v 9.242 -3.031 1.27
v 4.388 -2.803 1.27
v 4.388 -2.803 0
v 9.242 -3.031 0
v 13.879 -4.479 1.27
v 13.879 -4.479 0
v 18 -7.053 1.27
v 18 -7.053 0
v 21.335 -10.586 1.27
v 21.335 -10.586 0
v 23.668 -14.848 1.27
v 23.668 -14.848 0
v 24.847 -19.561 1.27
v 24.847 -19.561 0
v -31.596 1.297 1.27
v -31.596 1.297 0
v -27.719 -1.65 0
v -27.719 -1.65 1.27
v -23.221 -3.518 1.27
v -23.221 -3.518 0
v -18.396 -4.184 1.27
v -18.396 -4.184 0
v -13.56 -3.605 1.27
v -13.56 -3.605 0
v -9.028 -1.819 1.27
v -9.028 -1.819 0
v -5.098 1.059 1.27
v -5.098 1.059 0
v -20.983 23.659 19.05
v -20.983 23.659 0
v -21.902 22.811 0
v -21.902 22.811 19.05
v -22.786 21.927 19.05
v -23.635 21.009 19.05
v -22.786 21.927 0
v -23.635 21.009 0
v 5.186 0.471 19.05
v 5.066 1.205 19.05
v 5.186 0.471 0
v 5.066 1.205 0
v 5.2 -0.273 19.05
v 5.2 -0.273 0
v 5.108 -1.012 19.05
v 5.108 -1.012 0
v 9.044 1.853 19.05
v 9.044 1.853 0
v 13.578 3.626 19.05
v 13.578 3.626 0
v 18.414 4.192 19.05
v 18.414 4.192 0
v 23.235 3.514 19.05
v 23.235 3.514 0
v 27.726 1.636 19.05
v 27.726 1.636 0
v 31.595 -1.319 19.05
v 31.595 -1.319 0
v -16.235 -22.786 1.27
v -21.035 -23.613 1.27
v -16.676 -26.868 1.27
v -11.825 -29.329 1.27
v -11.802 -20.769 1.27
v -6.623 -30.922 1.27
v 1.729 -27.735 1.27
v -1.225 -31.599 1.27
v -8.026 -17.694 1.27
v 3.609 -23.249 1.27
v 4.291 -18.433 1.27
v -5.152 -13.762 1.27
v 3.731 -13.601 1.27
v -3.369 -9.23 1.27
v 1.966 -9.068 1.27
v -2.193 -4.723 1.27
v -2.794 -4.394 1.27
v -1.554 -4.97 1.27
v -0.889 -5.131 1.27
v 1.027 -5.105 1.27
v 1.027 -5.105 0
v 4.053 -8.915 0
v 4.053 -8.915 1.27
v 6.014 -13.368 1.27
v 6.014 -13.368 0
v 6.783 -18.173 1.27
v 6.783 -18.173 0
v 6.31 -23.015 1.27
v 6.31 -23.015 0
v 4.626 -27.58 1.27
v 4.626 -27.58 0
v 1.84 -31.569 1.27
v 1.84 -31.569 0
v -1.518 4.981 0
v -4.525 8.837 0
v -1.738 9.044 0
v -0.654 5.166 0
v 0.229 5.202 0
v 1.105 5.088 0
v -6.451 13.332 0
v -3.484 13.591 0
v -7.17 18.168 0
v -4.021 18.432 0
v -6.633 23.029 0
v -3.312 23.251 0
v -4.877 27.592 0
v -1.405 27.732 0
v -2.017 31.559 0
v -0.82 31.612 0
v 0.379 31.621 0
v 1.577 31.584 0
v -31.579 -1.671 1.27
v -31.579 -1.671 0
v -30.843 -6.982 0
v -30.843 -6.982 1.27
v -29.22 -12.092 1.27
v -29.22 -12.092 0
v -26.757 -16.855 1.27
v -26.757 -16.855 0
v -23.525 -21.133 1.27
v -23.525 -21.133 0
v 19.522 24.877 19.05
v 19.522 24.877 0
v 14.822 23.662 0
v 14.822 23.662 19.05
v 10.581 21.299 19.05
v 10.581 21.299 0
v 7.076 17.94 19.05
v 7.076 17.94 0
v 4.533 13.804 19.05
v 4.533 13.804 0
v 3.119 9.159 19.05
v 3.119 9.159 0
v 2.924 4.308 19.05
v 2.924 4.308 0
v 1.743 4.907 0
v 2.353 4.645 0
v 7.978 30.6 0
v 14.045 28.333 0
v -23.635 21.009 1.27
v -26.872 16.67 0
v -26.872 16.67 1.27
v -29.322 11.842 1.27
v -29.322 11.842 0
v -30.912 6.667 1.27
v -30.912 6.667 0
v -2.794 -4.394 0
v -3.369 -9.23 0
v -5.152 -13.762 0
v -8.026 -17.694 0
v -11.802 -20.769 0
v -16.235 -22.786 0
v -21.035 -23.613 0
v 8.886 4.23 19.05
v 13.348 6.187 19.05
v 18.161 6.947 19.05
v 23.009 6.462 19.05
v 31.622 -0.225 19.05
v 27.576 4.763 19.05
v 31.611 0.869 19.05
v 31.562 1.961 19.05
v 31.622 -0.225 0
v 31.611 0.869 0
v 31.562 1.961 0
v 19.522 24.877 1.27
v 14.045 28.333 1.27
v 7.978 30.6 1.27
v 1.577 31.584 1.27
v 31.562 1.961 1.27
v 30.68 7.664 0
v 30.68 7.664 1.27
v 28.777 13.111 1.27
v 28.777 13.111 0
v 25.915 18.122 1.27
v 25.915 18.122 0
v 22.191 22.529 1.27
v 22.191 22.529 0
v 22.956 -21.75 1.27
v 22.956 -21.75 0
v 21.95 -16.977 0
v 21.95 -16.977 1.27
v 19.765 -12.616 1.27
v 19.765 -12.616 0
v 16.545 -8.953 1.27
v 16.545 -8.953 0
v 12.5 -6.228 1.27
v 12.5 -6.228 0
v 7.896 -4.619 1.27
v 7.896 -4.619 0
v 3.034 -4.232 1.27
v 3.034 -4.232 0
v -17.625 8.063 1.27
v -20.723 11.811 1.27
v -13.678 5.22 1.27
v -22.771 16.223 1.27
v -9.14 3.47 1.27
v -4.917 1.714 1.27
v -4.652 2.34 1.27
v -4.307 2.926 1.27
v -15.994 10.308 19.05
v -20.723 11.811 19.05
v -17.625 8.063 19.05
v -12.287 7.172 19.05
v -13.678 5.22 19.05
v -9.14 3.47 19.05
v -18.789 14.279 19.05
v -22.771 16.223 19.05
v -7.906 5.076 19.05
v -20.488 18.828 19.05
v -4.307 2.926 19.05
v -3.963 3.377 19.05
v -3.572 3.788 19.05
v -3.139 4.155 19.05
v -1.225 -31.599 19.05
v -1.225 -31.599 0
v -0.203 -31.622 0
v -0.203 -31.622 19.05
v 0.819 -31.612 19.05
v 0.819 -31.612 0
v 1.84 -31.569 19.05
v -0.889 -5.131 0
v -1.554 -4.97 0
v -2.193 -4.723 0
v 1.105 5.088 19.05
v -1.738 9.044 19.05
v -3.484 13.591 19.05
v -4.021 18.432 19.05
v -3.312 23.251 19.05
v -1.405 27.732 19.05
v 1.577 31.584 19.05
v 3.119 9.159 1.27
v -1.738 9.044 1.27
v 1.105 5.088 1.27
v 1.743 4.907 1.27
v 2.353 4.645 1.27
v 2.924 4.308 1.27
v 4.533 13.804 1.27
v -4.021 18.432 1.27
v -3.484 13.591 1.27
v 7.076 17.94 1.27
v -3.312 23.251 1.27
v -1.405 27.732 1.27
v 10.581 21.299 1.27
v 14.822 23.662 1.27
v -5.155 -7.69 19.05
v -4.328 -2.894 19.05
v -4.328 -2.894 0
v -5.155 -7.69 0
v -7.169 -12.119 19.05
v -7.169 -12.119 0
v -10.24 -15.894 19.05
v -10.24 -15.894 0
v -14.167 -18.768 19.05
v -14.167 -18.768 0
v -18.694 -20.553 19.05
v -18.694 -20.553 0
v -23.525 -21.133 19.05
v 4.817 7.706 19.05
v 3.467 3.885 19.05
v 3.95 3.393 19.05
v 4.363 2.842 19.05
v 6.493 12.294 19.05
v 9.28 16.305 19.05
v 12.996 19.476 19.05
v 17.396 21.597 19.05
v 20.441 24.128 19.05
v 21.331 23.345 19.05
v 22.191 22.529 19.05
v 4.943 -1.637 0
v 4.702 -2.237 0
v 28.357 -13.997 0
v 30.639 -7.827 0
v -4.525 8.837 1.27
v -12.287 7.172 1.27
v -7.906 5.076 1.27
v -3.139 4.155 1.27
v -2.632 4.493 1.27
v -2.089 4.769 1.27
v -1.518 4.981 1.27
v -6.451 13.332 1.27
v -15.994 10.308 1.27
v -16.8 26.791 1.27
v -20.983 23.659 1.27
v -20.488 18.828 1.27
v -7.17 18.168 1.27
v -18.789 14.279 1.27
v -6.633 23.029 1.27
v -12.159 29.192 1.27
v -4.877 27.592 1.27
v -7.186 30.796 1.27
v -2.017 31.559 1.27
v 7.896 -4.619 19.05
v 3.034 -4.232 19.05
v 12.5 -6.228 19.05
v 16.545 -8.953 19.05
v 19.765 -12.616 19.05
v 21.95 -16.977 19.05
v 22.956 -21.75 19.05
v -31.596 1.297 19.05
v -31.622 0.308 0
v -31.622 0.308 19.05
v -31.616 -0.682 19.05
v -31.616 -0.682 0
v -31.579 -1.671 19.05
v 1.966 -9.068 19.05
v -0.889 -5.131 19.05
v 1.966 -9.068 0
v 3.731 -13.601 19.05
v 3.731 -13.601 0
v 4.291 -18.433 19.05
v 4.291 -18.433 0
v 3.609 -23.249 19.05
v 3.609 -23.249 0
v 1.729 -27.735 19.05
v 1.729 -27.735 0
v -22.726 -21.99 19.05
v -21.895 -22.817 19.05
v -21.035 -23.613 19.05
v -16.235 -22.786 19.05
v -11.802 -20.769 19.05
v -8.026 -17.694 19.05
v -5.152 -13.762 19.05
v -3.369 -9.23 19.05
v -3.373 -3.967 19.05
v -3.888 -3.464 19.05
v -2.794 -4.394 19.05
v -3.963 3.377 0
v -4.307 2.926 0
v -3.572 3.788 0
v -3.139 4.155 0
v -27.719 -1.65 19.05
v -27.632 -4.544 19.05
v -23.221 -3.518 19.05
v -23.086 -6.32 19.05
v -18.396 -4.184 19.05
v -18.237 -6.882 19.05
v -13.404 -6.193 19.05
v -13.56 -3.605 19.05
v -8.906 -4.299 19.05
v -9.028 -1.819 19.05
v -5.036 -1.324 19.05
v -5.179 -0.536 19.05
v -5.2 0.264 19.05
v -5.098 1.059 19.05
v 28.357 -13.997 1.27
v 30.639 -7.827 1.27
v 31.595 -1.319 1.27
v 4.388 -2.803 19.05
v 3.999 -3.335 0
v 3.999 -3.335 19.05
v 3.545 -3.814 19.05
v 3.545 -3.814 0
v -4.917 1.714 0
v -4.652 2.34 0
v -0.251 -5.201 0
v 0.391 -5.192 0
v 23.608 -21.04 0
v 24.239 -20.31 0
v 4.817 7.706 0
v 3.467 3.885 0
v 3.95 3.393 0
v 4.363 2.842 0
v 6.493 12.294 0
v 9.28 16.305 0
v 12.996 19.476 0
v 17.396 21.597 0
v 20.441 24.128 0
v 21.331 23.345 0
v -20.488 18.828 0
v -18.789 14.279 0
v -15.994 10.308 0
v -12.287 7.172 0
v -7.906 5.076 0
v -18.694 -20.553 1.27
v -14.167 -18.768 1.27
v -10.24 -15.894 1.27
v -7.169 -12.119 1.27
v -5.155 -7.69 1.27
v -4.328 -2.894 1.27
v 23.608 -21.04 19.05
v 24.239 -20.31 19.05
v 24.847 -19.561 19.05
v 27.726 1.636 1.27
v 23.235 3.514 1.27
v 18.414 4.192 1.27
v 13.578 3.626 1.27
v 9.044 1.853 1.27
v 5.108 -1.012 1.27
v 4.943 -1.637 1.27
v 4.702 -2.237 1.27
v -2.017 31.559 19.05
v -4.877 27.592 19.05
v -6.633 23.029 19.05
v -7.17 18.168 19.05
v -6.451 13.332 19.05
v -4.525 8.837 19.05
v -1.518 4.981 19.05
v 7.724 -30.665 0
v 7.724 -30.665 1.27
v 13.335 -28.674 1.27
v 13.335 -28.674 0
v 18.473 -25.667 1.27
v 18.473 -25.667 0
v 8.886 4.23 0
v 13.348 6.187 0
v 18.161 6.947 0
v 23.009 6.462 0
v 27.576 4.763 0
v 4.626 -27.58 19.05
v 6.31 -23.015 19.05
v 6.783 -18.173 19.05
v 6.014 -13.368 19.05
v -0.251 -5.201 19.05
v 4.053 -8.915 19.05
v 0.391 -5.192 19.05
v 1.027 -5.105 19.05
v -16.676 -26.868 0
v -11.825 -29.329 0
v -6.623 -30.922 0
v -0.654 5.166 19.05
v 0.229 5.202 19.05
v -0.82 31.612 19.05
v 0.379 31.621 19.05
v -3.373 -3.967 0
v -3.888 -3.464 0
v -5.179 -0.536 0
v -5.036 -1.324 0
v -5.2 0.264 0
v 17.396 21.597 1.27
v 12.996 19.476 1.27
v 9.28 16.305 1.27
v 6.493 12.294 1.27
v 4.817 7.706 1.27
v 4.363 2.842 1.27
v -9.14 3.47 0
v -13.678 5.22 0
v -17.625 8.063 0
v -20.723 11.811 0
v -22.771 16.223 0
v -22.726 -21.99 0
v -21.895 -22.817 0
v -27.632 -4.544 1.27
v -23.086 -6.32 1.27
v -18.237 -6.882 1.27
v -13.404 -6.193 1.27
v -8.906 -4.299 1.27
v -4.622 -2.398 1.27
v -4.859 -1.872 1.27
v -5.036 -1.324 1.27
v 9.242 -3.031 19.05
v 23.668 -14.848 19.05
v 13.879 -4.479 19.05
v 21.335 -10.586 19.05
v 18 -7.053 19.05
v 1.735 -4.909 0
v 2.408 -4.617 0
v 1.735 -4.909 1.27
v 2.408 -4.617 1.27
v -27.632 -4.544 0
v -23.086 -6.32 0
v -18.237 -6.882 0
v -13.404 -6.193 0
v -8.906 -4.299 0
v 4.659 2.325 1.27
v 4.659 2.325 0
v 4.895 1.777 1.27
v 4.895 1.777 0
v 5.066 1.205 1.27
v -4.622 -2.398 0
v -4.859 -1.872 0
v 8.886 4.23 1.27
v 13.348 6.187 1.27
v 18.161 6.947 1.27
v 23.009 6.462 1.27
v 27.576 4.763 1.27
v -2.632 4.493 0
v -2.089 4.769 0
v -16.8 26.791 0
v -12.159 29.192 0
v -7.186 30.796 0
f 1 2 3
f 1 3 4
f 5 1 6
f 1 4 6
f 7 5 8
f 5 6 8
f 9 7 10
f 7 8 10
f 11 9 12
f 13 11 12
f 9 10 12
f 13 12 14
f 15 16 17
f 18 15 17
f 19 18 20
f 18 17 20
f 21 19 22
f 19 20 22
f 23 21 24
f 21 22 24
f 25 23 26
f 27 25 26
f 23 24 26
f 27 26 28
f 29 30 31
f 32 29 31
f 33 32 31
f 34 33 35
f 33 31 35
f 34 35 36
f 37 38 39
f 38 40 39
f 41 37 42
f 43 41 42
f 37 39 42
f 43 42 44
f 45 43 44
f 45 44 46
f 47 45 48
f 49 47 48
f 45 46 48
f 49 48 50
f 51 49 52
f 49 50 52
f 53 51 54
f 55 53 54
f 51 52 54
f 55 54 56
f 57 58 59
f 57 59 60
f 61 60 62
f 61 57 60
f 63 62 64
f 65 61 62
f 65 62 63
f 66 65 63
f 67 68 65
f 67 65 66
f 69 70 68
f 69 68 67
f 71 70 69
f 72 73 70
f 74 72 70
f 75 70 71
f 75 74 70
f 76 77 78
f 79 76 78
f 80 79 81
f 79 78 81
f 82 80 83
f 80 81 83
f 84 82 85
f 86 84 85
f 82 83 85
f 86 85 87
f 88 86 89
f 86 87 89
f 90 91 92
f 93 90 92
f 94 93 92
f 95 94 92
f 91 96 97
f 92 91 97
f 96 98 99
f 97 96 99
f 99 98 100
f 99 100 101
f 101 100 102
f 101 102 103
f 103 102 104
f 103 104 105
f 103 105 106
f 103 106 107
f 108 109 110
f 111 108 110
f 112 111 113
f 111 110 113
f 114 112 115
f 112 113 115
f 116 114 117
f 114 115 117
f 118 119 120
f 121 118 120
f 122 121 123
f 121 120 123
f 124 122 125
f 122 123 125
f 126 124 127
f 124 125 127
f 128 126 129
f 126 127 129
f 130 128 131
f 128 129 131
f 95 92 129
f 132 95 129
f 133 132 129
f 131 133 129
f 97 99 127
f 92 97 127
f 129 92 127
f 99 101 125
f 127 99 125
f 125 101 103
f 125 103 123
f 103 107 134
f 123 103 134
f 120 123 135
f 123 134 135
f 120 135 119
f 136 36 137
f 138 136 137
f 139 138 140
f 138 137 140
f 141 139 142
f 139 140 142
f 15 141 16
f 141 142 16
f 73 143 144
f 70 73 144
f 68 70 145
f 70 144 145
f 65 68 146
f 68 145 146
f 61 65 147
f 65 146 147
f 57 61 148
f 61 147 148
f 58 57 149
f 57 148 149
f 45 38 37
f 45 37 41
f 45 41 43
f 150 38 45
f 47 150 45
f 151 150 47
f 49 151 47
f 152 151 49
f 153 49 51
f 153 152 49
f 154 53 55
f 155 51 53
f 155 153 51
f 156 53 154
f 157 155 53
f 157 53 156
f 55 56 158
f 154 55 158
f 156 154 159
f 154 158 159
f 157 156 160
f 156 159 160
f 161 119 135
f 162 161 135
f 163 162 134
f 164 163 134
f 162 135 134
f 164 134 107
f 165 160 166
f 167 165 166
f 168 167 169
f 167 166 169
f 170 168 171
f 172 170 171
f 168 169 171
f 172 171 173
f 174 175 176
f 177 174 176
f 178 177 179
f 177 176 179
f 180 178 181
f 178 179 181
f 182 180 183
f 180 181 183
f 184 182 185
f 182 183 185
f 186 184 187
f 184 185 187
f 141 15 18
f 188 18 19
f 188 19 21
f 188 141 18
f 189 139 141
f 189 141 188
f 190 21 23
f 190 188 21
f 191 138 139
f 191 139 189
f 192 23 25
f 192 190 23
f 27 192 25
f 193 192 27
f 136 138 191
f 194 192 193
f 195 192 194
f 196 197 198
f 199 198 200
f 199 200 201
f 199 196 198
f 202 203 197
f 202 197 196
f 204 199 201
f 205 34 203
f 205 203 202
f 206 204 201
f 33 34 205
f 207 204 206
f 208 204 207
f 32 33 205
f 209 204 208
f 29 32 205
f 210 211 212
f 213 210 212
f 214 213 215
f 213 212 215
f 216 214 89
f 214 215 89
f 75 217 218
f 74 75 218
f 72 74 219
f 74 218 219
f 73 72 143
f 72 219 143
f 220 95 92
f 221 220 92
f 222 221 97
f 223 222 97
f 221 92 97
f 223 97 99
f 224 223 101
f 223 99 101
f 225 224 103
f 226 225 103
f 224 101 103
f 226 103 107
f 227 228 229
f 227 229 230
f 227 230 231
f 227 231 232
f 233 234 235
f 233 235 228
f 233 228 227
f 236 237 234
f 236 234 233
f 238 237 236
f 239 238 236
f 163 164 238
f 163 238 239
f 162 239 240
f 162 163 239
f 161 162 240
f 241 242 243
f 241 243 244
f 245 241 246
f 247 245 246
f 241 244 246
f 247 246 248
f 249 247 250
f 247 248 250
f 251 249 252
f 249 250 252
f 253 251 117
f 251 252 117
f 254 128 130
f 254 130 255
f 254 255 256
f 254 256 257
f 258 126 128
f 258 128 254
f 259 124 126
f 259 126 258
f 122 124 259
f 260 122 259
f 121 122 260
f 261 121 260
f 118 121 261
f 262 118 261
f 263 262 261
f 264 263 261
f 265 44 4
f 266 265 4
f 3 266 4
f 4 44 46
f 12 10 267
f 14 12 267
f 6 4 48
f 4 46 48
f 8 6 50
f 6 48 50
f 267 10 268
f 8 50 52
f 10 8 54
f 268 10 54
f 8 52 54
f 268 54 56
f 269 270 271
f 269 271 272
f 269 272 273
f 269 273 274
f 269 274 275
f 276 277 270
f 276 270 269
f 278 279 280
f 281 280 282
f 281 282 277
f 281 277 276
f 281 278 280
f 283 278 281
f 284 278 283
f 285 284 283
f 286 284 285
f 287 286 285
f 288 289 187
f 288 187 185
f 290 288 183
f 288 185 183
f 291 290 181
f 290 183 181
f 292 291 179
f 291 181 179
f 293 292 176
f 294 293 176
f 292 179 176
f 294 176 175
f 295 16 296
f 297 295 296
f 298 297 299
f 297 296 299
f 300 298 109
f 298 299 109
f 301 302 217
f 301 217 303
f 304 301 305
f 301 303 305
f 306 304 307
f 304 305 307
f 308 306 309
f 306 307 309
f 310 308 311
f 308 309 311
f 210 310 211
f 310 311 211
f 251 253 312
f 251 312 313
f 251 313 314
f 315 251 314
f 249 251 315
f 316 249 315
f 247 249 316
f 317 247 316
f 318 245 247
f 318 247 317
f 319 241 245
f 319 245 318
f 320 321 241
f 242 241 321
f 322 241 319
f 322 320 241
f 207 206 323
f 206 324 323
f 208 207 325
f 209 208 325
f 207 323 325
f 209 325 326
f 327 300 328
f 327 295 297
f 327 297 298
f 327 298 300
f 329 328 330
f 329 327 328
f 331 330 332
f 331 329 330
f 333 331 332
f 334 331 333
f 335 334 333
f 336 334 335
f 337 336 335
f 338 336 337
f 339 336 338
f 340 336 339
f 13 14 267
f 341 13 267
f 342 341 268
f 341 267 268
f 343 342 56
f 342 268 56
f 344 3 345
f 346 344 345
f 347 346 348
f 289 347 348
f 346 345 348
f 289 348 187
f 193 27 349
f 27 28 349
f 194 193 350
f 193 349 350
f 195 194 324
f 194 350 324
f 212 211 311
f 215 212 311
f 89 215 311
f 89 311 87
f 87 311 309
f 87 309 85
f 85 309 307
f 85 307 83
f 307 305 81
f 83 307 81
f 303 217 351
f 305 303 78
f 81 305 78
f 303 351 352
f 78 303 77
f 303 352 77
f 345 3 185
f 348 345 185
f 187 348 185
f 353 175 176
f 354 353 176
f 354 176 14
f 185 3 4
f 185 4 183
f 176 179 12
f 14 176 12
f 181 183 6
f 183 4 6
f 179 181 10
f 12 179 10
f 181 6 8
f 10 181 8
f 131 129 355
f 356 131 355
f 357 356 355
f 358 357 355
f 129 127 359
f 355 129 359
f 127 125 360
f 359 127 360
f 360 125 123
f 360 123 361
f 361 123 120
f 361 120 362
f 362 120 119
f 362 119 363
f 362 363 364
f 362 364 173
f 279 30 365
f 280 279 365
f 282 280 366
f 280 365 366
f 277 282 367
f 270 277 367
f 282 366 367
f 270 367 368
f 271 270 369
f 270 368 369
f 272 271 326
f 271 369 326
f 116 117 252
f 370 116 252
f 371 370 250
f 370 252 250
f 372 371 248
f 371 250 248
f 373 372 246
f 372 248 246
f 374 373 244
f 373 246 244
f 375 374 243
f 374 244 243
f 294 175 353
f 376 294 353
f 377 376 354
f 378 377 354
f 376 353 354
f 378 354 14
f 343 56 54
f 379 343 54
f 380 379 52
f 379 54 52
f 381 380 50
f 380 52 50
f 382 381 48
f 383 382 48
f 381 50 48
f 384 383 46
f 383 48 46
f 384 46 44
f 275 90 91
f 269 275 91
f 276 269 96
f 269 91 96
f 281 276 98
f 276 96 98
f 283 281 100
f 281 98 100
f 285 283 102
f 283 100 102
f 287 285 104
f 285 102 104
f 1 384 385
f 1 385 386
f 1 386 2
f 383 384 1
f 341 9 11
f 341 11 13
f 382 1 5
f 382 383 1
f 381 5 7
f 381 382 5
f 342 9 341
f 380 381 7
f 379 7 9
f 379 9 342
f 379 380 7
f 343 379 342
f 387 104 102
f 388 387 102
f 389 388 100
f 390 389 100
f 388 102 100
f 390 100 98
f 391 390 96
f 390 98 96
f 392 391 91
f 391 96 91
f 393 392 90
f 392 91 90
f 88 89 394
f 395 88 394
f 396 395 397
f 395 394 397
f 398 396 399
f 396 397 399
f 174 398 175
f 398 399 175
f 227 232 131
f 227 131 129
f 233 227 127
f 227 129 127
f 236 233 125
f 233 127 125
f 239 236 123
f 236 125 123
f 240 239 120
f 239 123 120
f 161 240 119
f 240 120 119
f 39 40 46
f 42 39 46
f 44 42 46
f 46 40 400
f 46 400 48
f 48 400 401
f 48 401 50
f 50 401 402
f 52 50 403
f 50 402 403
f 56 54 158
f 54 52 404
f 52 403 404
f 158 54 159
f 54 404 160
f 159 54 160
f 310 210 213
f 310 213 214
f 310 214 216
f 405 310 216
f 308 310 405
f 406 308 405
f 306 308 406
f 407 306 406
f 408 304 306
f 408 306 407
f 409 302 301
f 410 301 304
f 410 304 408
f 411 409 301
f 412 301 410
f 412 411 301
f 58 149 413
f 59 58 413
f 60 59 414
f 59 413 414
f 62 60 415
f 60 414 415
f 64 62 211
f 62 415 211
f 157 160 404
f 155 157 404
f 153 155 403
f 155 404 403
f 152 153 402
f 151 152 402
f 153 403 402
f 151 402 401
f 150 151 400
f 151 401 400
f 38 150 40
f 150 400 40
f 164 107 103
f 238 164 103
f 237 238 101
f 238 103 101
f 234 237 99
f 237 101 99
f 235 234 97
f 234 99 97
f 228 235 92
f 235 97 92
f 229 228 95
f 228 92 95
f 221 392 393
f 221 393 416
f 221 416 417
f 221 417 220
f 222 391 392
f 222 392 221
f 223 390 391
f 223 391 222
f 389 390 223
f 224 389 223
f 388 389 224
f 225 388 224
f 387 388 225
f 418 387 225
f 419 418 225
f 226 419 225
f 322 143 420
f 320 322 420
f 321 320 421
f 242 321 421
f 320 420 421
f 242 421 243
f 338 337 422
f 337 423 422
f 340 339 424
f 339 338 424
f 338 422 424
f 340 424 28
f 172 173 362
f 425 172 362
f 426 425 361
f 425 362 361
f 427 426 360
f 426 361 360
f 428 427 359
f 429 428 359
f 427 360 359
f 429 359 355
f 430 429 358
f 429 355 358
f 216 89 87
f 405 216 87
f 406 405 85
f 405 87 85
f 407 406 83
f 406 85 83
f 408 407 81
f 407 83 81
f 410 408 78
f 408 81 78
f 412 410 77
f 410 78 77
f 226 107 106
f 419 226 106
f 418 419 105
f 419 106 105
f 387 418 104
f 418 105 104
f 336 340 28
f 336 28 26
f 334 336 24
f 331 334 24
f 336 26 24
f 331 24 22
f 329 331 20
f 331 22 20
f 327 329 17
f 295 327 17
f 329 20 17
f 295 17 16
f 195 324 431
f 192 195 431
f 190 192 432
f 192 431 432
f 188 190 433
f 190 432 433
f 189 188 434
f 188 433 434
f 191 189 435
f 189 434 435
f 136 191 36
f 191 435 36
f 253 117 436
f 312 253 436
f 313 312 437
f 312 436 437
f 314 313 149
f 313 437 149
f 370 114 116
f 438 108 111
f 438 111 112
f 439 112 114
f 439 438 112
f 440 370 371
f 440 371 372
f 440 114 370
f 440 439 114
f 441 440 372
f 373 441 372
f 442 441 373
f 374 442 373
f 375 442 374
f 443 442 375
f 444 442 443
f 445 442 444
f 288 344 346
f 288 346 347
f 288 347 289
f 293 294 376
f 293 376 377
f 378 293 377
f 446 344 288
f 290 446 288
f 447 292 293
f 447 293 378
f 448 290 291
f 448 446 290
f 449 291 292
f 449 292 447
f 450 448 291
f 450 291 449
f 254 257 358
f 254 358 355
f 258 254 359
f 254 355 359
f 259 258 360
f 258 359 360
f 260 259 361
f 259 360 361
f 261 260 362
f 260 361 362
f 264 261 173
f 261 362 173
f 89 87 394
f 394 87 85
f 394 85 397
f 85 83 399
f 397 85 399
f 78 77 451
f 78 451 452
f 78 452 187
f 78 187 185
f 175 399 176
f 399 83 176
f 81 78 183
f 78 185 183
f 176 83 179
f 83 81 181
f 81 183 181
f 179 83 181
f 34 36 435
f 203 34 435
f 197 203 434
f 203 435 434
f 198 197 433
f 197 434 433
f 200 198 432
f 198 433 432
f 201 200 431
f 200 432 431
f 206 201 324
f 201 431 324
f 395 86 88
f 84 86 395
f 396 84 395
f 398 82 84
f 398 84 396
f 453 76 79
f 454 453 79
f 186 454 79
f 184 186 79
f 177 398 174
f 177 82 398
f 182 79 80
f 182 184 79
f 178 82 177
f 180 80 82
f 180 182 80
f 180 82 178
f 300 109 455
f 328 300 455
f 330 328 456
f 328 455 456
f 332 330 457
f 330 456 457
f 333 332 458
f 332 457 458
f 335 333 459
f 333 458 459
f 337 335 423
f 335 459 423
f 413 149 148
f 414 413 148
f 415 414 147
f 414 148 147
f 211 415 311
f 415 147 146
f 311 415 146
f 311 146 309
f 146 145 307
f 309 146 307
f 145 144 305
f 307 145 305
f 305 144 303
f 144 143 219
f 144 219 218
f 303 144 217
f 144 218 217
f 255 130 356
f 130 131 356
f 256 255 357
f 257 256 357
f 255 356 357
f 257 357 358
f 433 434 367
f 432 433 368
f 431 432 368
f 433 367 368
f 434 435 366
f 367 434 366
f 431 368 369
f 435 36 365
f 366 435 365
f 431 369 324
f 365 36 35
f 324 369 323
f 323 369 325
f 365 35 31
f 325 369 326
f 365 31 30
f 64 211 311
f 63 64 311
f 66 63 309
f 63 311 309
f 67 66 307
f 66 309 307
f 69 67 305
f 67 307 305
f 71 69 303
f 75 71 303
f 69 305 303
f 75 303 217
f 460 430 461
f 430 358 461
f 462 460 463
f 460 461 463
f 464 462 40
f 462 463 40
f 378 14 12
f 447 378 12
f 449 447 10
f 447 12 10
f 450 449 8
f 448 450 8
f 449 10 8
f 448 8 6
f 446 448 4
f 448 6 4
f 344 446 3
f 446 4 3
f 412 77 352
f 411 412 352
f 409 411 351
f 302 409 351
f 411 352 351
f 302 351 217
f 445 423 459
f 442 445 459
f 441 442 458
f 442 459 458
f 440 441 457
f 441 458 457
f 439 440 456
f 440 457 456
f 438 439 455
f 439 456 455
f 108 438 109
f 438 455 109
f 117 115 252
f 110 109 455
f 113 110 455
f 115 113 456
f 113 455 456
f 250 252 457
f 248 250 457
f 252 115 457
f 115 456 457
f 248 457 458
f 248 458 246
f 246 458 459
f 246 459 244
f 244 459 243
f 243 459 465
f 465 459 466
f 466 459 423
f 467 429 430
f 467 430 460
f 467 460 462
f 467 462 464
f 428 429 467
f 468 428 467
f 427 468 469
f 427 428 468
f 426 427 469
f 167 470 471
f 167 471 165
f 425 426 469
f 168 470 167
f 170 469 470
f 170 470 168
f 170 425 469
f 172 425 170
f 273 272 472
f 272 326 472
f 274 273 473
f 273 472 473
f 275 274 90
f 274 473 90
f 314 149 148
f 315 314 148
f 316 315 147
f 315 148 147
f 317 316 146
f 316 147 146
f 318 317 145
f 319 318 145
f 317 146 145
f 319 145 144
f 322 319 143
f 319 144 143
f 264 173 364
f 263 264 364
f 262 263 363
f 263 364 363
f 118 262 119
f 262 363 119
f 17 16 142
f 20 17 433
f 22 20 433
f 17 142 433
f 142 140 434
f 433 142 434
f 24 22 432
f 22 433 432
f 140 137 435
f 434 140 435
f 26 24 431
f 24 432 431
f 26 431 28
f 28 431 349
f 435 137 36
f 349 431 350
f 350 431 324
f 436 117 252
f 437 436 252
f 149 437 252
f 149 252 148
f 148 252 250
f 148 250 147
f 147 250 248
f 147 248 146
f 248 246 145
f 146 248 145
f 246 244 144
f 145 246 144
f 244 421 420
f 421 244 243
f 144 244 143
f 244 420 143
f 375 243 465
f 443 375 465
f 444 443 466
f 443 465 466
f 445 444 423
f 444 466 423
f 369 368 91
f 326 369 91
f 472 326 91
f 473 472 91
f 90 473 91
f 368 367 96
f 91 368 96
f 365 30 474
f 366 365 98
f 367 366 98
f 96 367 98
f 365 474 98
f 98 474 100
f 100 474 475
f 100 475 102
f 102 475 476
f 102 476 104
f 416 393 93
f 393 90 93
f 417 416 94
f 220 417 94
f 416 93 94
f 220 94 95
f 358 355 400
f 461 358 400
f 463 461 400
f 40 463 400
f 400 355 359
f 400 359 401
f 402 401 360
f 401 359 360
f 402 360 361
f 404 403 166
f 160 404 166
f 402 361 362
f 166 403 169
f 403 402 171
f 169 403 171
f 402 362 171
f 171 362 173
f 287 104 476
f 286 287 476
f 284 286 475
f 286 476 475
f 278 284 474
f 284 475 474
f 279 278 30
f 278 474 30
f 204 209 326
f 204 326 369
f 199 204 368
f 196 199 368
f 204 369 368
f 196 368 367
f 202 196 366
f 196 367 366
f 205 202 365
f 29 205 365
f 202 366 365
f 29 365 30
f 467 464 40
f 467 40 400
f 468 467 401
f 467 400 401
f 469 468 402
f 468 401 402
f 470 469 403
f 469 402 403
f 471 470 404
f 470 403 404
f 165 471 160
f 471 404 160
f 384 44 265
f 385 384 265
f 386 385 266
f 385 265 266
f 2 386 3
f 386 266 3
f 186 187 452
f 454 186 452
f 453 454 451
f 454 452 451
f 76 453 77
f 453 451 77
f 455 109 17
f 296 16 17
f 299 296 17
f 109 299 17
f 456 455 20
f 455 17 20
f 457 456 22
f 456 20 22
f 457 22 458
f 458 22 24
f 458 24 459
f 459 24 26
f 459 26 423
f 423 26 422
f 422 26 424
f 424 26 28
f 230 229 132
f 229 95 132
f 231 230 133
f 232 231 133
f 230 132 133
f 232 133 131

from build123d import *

# Parameters (mm, degrees)
F1_DEPTH = 19.05
F2_DEPTH = 1.27
F4_D     = 10.414
F4_2_D   = 10.414


with BuildPart() as f1:
    # F0 (on Top) → F1 (new body)
    with BuildSketch(Plane.XY):
        with BuildLine():
            ThreePointArc((-4.15057, 2.929021), (-3.596615, 3.587584), (-2.939447, 4.143194))
            ThreePointArc((-2.939447, 4.143194), (-15.926713, 10.234619), (-20.982556, 23.658962))
            ThreePointArc((-20.982556, 23.658962), (-22.348308, 22.373361), (-23.635438, 21.00905))
            ThreePointArc((-23.635438, 21.00905), (-17.567432, 8.009101), (-4.15057, 2.929021))
        make_face()
        with BuildLine():
            ThreePointArc((-1.414659, 4.879051), (-0.078206, 5.079398), (1.263782, 4.92029))
            ThreePointArc((1.263782, 4.92029), (-4.022436, 18.315919), (1.57705, 31.583652))
            ThreePointArc((1.57705, 31.583652), (-0.220309, 31.622233), (-2.016956, 31.558612))
            ThreePointArc((-2.016956, 31.558612), (-7.168019, 18.095747), (-1.414659, 4.879051))
        make_face()
        with BuildLine():
            ThreePointArc((2.939447, 4.143194), (3.738822, 3.439129), (4.373801, 2.583847))
            ThreePointArc((4.373801, 2.583847), (9.193806, 16.20891), (22.190942, 22.529452))
            ThreePointArc((22.190942, 22.529452), (20.88971, 23.74098), (19.522447, 24.877463))
            ThreePointArc((19.522447, 24.877463), (7.023926, 17.875049), (2.939447, 4.143194))
        make_face()
        with BuildLine():
            ThreePointArc((4.960279, 1.096374), (5.049981, 0.551446), (5.08, 0))
            ThreePointArc((5.08, 0), (5.045837, -0.588156), (4.943808, -1.168401))
            ThreePointArc((4.943808, -1.168401), (18.300314, 4.193169), (31.595492, -1.31872))
            ThreePointArc((31.595492, -1.31872), (31.621363, 0.32179), (31.562112, 1.961433))
            ThreePointArc((31.562112, 1.961433), (18.085065, 6.945155), (4.960279, 1.096374))
        make_face()
        with BuildLine():
            ThreePointArc((24.846985, -19.561224), (17.937118, -7.00249), (4.227848, -2.816328))
            ThreePointArc((4.227848, -2.816328), (3.580795, -3.603375), (2.789696, -4.245468))
            ThreePointArc((2.789696, -4.245468), (16.453026, -8.872834), (22.955675, -21.749738))
            ThreePointArc((22.955675, -21.749738), (23.926366, -20.677117), (24.846985, -19.561224))
        make_face()
        with BuildLine():
            ThreePointArc((1.839998, -31.569424), (6.78046, -18.095188), (0.91574, -4.996781))
            ThreePointArc((0.91574, -4.996781), (-0.063033, -5.079609), (-1.039449, -4.972519))
            ThreePointArc((-1.039449, -4.972519), (4.292181, -18.323762), (-1.225371, -31.59925))
            ThreePointArc((-1.225371, -31.59925), (0.307675, -31.621503), (1.839998, -31.569424))
        make_face()
        with BuildLine():
            ThreePointArc((-21.034558, -23.61274), (-7.97312, -17.63866), (-2.795924, -4.241369))
            ThreePointArc((-2.795924, -4.241369), (-3.643508, -3.53995), (-4.320202, -2.672499))
            ThreePointArc((-4.320202, -2.672499), (-10.15953, -15.817398), (-23.524903, -21.132749))
            ThreePointArc((-23.524903, -21.132749), (-22.31421, -22.407368), (-21.034558, -23.61274))
        make_face()
        with BuildLine():
            ThreePointArc((-4.931575, -1.219001), (-5.08, 0), (-4.931575, 1.219001))
            ThreePointArc((-4.931575, 1.219001), (-18.279969, -4.18489), (-31.596377, 1.297347))
            ThreePointArc((-31.596377, 1.297347), (-31.622446, -0.187197), (-31.578803, -1.671328))
            ThreePointArc((-31.578803, -1.671328), (-18.162923, -6.880688), (-4.931575, -1.219001))
        make_face()
    extrude(amount=F1_DEPTH)

    # F4 (through all)
    with Locations(Plane.XY.offset(19.05)):
        with Locations((0, 0)):
            Hole(F4_D / 2)


with BuildPart() as f2:
    # F0 (on Top) → F2 (new body)
    with BuildSketch(Plane.XY):
        with BuildLine():
            ThreePointArc((-4.931575, 1.219001), (-4.620864, 2.110454), (-4.15057, 2.929021))
            ThreePointArc((-4.15057, 2.929021), (-17.567432, 8.009101), (-23.635438, 21.00905))
            ThreePointArc((-23.635438, 21.00905), (-29.32194, 11.842211), (-31.596377, 1.297347))
            ThreePointArc((-31.596377, 1.297347), (-18.279969, -4.18489), (-4.931575, 1.219001))
        make_face()
        with BuildLine():
            ThreePointArc((-2.939447, 4.143194), (-2.207924, 4.575092), (-1.414659, 4.879051))
            ThreePointArc((-1.414659, 4.879051), (-7.168019, 18.095747), (-2.016956, 31.558612))
            ThreePointArc((-2.016956, 31.558612), (-12.159173, 29.191927), (-20.982556, 23.658962))
            ThreePointArc((-20.982556, 23.658962), (-15.926713, 10.234619), (-2.939447, 4.143194))
        make_face()
        with BuildLine():
            ThreePointArc((1.263782, 4.92029), (2.13723, 4.608541), (2.939447, 4.143194))
            ThreePointArc((2.939447, 4.143194), (7.023926, 17.875049), (19.522447, 24.877463))
            ThreePointArc((19.522447, 24.877463), (11.069798, 29.622183), (1.57705, 31.583652))
            ThreePointArc((1.57705, 31.583652), (-4.022436, 18.315919), (1.263782, 4.92029))
        make_face()
        with BuildLine():
            ThreePointArc((4.373801, 2.583847), (4.725929, 1.863329), (4.960279, 1.096374))
            ThreePointArc((4.960279, 1.096374), (18.085065, 6.945155), (31.562112, 1.961433))
            ThreePointArc((31.562112, 1.961433), (28.776875, 13.111277), (22.190942, 22.529452))
            ThreePointArc((22.190942, 22.529452), (9.193806, 16.20891), (4.373801, 2.583847))
        make_face()
        with BuildLine():
            ThreePointArc((31.595492, -1.31872), (18.300314, 4.193169), (4.943808, -1.168401))
            ThreePointArc((4.943808, -1.168401), (4.659263, -2.024269), (4.227848, -2.816328))
            ThreePointArc((4.227848, -2.816328), (17.937118, -7.00249), (24.846985, -19.561224))
            ThreePointArc((24.846985, -19.561224), (29.65865, -10.971718), (31.595492, -1.31872))
        make_face()
        with BuildLine():
            ThreePointArc((22.955675, -21.749738), (16.453026, -8.872834), (2.789696, -4.245468))
            ThreePointArc((2.789696, -4.245468), (1.890418, -4.715158), (0.91574, -4.996781))
            ThreePointArc((0.91574, -4.996781), (6.78046, -18.095188), (1.839998, -31.569424))
            ThreePointArc((1.839998, -31.569424), (13.334651, -28.674051), (22.955675, -21.749738))
        make_face()
        with BuildLine():
            ThreePointArc((-1.225371, -31.59925), (4.292181, -18.323762), (-1.039449, -4.972519))
            ThreePointArc((-1.039449, -4.972519), (-1.952221, -4.689908), (-2.795924, -4.241369))
            ThreePointArc((-2.795924, -4.241369), (-7.97312, -17.63866), (-21.034558, -23.61274))
            ThreePointArc((-21.034558, -23.61274), (-11.824644, -29.329029), (-1.225371, -31.59925))
        make_face()
        with BuildLine():
            ThreePointArc((-23.524903, -21.132749), (-10.15953, -15.817398), (-4.320202, -2.672499))
            ThreePointArc((-4.320202, -2.672499), (-4.682629, -1.969616), (-4.931575, -1.219001))
            ThreePointArc((-4.931575, -1.219001), (-18.162923, -6.880688), (-31.578803, -1.671328))
            ThreePointArc((-31.578803, -1.671328), (-29.219708, -12.092262), (-23.524903, -21.132749))
        make_face()
    extrude(amount=F2_DEPTH)

    # F4#2 (through all)
    with Locations(Plane.XY.offset(19.05)):
        with Locations((0, 0)):
            Hole(F4_2_D / 2)


solid = Compound([f1.part, f2.part])
